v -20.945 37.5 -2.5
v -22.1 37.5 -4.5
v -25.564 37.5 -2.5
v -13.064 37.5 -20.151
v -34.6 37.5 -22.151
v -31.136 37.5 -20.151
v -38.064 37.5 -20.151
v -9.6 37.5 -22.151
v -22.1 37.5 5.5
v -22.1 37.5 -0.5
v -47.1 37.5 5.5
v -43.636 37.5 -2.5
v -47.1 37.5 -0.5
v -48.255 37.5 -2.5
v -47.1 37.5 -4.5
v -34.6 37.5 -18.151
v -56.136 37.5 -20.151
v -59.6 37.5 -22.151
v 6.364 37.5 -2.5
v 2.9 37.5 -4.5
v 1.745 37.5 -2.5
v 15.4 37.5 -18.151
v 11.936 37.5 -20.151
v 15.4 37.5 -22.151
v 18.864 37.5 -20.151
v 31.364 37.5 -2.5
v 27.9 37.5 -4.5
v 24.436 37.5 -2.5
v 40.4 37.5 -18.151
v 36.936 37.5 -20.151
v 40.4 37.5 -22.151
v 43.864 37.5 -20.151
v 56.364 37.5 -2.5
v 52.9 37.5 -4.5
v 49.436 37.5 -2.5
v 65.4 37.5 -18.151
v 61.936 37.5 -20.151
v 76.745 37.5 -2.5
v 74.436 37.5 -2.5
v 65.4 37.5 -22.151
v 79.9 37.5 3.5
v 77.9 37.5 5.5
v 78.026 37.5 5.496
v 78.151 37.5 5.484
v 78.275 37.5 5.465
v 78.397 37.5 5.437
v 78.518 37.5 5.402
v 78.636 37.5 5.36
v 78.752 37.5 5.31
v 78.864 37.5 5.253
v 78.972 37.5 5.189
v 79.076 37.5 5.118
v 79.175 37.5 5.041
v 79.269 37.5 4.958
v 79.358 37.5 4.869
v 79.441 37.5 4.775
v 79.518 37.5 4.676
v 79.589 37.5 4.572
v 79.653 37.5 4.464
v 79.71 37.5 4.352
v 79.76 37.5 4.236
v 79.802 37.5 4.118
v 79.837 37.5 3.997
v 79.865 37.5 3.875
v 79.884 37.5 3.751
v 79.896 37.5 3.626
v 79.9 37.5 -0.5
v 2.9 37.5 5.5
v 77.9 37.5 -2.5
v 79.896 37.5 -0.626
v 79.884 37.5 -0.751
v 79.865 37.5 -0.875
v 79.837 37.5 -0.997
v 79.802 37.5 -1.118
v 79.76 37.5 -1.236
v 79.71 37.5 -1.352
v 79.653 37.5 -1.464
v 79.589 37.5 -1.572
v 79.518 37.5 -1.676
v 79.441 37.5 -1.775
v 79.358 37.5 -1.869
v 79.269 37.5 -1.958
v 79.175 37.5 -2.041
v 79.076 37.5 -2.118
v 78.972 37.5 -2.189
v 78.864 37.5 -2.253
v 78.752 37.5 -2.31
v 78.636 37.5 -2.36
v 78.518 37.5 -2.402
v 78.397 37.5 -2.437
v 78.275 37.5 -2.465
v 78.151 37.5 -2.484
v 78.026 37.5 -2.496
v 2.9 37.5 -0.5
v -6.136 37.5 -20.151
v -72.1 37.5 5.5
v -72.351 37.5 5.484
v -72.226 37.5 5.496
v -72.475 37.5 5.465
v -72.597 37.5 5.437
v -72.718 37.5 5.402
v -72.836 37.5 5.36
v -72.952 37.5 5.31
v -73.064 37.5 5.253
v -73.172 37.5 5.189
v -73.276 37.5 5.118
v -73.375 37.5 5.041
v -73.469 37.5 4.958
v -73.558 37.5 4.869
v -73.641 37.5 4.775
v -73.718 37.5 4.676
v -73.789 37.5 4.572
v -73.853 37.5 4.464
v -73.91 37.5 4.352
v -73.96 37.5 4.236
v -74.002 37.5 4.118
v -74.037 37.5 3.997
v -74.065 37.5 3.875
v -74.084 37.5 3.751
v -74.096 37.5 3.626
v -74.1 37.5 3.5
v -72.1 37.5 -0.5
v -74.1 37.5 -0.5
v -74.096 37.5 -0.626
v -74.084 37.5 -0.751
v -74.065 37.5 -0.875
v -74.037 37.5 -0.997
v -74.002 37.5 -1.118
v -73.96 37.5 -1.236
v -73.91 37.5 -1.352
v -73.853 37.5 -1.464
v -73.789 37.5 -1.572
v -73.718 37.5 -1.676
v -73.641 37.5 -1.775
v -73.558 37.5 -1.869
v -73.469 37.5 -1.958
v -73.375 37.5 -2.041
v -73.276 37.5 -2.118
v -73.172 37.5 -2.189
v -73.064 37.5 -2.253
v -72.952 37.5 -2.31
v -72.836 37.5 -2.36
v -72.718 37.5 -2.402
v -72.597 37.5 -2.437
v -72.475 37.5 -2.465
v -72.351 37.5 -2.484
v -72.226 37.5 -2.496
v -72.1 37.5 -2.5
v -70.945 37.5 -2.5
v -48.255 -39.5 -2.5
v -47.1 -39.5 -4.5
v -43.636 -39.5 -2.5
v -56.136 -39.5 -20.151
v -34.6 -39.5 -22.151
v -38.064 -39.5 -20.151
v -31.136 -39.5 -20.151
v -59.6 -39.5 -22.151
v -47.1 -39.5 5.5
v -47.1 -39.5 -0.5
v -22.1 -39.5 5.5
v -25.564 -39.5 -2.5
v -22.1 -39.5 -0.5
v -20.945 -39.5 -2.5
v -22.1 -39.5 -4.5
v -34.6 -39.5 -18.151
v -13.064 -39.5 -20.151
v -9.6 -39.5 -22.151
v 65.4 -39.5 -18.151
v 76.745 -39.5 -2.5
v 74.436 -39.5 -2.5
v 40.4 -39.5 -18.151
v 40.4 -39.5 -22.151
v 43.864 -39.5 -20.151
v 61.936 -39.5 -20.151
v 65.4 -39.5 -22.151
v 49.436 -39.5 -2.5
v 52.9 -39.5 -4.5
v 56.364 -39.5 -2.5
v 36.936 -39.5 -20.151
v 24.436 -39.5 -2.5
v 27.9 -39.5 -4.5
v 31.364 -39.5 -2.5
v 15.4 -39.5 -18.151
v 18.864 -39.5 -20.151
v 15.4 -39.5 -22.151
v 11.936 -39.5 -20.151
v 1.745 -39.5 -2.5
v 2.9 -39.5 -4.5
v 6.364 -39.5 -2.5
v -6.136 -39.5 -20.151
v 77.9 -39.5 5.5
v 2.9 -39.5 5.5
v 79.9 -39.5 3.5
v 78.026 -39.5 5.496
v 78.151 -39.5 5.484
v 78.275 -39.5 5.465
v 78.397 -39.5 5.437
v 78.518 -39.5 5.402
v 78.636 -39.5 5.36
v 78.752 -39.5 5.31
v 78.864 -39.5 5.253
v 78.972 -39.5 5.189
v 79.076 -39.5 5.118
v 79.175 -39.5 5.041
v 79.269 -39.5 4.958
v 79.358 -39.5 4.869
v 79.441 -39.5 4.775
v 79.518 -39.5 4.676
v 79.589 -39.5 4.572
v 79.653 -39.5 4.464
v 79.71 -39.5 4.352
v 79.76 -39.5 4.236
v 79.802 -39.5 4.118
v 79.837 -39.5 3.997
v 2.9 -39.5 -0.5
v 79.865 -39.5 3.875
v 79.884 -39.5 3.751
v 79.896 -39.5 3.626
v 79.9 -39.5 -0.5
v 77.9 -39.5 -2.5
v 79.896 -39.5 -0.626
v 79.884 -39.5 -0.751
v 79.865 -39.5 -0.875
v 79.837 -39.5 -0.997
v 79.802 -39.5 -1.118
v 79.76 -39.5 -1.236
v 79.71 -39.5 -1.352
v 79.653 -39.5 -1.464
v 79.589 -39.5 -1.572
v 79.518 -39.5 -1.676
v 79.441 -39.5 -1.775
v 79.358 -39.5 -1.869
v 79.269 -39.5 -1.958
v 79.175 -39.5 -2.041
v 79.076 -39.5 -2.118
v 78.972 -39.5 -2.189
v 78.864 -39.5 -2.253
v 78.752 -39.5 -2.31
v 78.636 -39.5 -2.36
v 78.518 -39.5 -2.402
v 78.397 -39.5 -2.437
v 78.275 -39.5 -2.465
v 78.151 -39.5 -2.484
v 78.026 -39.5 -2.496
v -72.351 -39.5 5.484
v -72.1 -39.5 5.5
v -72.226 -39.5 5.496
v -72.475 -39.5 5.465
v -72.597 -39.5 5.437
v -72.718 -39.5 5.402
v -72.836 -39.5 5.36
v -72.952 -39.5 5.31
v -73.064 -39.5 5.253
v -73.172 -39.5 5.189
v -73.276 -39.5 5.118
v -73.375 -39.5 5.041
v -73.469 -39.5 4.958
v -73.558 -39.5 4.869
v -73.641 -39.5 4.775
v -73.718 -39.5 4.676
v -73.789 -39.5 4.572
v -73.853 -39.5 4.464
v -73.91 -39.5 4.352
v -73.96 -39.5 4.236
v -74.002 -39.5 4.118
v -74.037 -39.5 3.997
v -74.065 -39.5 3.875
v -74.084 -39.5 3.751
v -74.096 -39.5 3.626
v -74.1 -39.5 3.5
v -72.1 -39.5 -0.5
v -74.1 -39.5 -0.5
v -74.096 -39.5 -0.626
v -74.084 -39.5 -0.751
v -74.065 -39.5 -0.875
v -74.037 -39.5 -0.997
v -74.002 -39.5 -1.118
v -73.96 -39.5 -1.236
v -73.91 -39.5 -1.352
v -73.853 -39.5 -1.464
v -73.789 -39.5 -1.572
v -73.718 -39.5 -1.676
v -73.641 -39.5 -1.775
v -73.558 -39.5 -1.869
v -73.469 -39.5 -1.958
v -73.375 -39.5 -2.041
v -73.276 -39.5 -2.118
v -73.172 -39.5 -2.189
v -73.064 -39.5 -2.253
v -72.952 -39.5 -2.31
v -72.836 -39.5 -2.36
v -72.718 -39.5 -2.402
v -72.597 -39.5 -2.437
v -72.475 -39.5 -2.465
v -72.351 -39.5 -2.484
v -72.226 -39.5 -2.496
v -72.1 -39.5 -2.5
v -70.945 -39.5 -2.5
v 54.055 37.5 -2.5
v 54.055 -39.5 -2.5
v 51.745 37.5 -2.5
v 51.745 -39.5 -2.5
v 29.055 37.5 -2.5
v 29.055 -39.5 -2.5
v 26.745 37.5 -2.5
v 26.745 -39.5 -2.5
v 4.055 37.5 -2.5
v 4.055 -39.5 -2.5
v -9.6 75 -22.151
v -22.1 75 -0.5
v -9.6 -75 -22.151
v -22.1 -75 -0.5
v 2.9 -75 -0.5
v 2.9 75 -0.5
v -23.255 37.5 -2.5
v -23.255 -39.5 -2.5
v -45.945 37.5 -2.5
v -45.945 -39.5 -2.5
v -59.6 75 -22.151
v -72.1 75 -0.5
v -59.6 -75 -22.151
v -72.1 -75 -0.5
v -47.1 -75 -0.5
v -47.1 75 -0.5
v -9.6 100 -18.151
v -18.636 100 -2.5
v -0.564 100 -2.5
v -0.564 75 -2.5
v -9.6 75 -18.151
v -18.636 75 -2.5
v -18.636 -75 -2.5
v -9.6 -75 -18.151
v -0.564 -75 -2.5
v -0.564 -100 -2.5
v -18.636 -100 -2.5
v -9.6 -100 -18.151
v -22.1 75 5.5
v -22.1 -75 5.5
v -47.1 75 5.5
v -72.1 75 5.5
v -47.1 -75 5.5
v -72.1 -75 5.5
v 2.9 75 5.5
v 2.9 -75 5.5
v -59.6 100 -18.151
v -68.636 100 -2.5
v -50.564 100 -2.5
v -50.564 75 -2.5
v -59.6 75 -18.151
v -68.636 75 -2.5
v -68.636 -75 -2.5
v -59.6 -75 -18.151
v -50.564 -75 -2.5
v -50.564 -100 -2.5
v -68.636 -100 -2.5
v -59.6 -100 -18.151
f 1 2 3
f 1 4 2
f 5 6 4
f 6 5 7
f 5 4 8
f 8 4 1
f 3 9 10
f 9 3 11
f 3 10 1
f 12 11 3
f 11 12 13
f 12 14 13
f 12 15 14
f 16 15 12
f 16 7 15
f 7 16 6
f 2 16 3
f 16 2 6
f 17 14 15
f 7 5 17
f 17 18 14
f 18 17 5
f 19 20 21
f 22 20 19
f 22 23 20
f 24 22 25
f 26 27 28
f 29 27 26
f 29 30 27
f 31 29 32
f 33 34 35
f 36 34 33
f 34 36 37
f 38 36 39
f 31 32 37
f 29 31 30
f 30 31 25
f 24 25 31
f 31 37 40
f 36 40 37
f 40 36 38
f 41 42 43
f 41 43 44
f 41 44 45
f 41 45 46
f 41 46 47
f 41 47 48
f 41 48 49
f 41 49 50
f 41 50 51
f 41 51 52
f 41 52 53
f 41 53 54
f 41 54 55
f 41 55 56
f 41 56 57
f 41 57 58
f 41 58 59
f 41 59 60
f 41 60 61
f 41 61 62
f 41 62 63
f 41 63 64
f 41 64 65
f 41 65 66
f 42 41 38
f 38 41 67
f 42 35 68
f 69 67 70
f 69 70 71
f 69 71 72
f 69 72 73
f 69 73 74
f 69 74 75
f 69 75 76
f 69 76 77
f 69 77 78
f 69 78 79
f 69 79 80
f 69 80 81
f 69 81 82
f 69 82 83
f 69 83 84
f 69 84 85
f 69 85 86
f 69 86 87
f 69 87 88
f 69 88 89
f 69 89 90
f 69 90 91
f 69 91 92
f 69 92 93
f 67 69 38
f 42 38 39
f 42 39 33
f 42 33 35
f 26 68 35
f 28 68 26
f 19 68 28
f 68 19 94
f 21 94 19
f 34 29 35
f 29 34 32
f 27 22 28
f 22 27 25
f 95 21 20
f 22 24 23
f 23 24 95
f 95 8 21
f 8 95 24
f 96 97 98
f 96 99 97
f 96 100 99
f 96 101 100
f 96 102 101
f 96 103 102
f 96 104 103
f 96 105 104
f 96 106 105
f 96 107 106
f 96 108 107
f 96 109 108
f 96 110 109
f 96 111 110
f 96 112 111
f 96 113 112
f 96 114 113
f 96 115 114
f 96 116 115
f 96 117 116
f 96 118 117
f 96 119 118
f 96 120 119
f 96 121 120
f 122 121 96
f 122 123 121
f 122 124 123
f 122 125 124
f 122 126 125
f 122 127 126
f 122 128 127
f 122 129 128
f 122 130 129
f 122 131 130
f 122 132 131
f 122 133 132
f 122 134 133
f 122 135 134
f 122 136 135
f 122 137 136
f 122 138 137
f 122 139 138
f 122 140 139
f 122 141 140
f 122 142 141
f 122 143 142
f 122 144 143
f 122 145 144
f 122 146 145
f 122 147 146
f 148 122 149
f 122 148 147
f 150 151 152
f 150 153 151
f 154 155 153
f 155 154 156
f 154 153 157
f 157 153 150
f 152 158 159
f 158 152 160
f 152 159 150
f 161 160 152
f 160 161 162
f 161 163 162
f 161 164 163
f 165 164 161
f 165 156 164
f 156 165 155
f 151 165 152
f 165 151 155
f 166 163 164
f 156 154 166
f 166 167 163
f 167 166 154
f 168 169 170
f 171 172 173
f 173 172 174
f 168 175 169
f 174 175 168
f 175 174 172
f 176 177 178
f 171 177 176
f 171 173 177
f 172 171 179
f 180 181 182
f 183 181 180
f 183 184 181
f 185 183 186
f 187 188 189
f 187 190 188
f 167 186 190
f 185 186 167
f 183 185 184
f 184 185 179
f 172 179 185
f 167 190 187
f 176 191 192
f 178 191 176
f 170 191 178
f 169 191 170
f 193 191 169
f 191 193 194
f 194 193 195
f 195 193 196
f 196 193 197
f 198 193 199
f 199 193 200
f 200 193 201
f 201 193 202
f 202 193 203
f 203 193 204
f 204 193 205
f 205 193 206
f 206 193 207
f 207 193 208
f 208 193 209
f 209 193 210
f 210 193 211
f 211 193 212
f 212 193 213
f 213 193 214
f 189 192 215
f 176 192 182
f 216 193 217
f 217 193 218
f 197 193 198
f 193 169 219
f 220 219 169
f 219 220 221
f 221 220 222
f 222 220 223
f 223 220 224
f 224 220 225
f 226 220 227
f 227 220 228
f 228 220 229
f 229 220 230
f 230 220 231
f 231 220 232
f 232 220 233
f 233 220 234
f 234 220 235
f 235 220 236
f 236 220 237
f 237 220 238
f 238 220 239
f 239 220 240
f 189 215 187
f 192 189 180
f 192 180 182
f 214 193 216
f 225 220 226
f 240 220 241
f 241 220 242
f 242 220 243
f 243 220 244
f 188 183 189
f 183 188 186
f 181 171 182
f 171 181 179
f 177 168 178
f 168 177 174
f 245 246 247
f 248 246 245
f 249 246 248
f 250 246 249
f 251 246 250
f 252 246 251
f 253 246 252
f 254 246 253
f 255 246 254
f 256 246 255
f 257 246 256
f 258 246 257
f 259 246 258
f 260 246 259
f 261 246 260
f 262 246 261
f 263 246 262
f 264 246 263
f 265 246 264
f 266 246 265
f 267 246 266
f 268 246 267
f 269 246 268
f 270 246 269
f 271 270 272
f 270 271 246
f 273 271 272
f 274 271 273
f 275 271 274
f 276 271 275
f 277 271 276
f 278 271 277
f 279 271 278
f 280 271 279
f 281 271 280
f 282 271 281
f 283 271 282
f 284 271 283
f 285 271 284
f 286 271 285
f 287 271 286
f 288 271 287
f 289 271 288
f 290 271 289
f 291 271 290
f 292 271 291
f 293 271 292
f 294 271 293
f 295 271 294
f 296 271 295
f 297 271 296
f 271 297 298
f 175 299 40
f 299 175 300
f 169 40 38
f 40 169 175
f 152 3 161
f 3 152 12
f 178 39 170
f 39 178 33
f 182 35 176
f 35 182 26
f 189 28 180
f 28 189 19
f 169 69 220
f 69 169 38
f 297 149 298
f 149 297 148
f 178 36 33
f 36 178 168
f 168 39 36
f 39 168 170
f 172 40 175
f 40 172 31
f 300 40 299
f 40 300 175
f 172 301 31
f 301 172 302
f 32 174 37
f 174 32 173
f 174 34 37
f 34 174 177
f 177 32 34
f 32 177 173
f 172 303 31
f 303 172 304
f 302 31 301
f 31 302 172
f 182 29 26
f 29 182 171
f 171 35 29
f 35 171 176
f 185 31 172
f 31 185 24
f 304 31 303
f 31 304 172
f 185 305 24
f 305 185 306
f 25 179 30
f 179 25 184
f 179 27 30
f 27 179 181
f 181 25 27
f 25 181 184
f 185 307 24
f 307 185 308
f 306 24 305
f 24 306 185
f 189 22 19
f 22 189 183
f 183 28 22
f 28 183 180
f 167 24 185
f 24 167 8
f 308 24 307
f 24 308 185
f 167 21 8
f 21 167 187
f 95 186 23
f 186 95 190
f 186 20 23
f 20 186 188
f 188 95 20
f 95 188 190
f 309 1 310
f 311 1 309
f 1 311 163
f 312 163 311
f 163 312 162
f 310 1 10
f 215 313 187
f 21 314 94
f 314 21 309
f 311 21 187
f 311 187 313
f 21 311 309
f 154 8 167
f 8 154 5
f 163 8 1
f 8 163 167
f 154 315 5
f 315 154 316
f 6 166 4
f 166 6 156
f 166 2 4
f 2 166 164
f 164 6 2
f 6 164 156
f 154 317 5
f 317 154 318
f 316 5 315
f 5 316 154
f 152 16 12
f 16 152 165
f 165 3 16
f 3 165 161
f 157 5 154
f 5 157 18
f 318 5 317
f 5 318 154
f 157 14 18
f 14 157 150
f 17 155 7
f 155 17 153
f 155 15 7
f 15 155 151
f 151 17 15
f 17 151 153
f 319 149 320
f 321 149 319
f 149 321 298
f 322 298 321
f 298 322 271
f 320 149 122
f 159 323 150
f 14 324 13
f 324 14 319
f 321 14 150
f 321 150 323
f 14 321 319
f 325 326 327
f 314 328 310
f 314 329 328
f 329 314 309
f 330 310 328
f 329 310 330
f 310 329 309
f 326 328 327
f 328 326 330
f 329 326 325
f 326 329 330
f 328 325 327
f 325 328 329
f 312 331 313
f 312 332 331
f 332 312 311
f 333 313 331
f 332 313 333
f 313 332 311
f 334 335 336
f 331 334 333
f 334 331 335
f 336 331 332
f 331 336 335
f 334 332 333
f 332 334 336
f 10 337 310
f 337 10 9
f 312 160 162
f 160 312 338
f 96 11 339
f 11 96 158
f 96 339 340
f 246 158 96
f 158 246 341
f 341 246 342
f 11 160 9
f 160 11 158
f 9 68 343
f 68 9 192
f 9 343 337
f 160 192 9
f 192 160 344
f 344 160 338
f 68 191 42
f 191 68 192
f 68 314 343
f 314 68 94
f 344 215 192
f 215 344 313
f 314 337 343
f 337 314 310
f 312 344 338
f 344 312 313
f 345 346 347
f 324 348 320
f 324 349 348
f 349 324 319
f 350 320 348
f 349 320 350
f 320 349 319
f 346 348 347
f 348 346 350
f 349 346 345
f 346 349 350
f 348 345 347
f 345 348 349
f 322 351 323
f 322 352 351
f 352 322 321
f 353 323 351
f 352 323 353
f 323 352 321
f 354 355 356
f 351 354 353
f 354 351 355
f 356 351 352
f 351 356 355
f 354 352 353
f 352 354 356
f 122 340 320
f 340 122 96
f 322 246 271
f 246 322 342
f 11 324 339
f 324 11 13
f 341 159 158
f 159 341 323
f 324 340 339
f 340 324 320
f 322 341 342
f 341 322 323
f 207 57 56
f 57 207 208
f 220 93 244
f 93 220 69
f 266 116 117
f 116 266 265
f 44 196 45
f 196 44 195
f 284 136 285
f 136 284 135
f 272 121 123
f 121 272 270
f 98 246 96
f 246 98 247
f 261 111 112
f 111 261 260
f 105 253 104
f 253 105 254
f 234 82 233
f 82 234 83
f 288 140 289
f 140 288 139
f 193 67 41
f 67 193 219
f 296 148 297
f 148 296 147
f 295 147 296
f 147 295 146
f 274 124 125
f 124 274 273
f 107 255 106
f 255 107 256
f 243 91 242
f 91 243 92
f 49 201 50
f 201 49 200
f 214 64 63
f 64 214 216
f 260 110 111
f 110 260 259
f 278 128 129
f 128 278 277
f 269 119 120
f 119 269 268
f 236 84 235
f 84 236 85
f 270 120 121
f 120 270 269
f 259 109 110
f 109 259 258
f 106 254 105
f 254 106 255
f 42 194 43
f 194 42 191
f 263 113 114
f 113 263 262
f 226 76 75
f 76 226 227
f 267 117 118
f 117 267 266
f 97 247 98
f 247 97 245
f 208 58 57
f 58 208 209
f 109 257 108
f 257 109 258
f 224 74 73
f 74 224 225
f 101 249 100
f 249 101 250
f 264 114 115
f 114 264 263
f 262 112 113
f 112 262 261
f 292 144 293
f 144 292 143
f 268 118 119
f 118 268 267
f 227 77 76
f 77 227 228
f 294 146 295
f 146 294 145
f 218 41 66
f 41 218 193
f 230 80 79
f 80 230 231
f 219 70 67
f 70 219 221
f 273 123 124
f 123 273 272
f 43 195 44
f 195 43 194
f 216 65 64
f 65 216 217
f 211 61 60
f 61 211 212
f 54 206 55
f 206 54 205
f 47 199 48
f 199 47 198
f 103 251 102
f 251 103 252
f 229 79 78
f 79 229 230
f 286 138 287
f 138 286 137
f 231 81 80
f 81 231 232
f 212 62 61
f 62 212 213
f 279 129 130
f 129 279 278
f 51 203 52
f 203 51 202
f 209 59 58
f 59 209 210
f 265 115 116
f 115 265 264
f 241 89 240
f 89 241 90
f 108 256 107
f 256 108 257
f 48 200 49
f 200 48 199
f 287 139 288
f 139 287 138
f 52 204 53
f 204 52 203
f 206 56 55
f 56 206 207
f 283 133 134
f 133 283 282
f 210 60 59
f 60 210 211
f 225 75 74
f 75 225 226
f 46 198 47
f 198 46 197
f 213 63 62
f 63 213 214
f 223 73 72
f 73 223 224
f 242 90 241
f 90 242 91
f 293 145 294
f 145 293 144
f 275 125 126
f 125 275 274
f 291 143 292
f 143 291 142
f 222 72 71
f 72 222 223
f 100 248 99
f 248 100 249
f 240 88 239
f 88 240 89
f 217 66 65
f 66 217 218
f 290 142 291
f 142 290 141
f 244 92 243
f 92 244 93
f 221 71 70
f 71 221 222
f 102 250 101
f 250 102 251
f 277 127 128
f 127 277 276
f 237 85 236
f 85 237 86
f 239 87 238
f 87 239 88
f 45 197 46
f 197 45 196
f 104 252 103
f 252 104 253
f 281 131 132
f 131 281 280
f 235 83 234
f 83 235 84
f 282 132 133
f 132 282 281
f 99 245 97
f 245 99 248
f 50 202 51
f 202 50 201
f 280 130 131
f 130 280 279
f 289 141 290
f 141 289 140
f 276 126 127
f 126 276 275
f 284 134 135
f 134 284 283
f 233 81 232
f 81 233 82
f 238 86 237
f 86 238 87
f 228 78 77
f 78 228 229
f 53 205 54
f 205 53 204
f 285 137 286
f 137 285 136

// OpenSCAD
epaisseur_flycase = 14.5;
hauteur_flycase = 65;
epaisseur = 4;
epaisseur_minkowski = 2;
epaisseur_triangle = epaisseur/2;
longueur_support = 150;
largeur_support = 25;
longueur_PC = 150;
hauteur_PC = 20;
detail = 100;
angle = 30;
cote_grand_triangle = longueur_PC/6;
cote_triangle = cote_grand_triangle - 2*epaisseur_triangle/tan(angle);
hauteur_grand_triangle = cos(angle)*cote_grand_triangle;
hauteur_triangle = cos(angle)*cote_triangle;
echo(hauteur_grand_triangle);

    
module fente_flycase(){
    difference(){
        cube([epaisseur_flycase + 2*epaisseur, hauteur_flycase + epaisseur, largeur_support]);
        translate([epaisseur, 0 ,-0.5])
        cube([epaisseur_flycase, hauteur_flycase, largeur_support+1]);
    }
}

module plateau_PC(){
    minkowski (){
        union(){
            cube([longueur_PC, epaisseur, largeur_support - epaisseur_minkowski]);
            cube([epaisseur, hauteur_PC,largeur_support - epaisseur_minkowski]);
        }
        cylinder(r=epaisseur_minkowski, h=epaisseur_minkowski, $fn=detail);
    }
}

module triangle(largeur){
    difference(){
        linear_extrude(height=largeur) 
        polygon(points=[[0,0],[cote_grand_triangle,0],[cote_grand_triangle/2,hauteur_grand_triangle]],paths=[ [0,1,2] ]);
        
        translate([epaisseur_triangle/tan(30),epaisseur_triangle,-0.5])
        linear_extrude(height=largeur+1) 
        polygon(points=[[0,0],[cote_triangle,0],[cote_triangle/2,hauteur_triangle]],paths=[ [0,1,2] ]);
    }
}

module pattern_triangle(largeur, n, x){
    for ( j = [0 : n-x] ){   
        for ( i = [1 : n-j] ){   
            translate([(j*1/2+i-1)*cote_grand_triangle,j*hauteur_grand_triangle,0])
            triangle(largeur);
            if(i<(n-j)){
                translate([(i+(1+j)/2)*cote_grand_triangle,(j+1)*hauteur_grand_triangle,0])
                rotate([0,0,180])
                triangle(largeur);
            }
        }
    }
}

module support_triangles(){
    difference(){
        union(){
            translate([longueur_PC+epaisseur/2,0,0])
            rotate([0,0,180])
            pattern_triangle(largeur_support, 6,3);
            plateau_PC();
        }
        
        translate([longueur_PC,0,0])
    rotate([0,0,1.5*angle])
    translate([-6*hauteur_grand_triangle,-2*cote_grand_triangle,-0.5])
    cube([6*hauteur_grand_triangle+epaisseur, 2*cote_grand_triangle, largeur_support+1]);
    }
    rotate([0,0,-2*angle])
    translate([0,-epaisseur/2,0])
    cube([4*cote_grand_triangle+2*epaisseur_minkowski, epaisseur, largeur_support]);
    
    translate([longueur_PC,0,0])
    rotate([0,0,1.5*angle])
    translate([-5*hauteur_grand_triangle-epaisseur/2,-epaisseur/2,0])
    cube([5*hauteur_grand_triangle+epaisseur, epaisseur, largeur_support]);
}

module support_1(){
    difference(){
    translate([epaisseur/4,cote_grand_triangle,0])
    rotate([0,0,angle])
    translate([-3*cote_grand_triangle,0,0])
    support_triangles();
    translate([hauteur_grand_triangle+epaisseur,-(hauteur_flycase+epaisseur),-0.5])
    cube([epaisseur_flycase + 2*epaisseur, hauteur_flycase + epaisseur, largeur_support+1]);
}
translate([hauteur_grand_triangle+epaisseur,-(hauteur_flycase+epaisseur),0])
fente_flycase();

}


module barre(){
    rotate([90,0,0])
    difference(){
        linear_extrude(height=longueur_support+2*largeur_support) 
        polygon(points=[[0,0],[cote_grand_triangle,0],[cote_grand_triangle/2,hauteur_grand_triangle]],paths=[ [0,1,2] ]);
        triangle(largeur_support);
        translate([0,0,longueur_support+largeur_support]) triangle(largeur_support);
    }
    translate([0,-longueur_support-largeur_support,-(epaisseur+epaisseur_minkowski)])
        cube([cote_grand_triangle, longueur_PC, epaisseur+epaisseur_minkowski]);
}

module support_2(){
    translate([epaisseur/2+0.9,0,-0.5])
    union(){
        translate([0,0,epaisseur_minkowski])
        minkowski (){
            cube([longueur_PC, 3*largeur_support, epaisseur], center=true);
            rotate([90,0,0]) cylinder(r=epaisseur_minkowski, h=epaisseur_minkowski, $fn=detail);
        }
        translate([longueur_PC/2,3*largeur_support/2,0])
                rotate([-90,0,180])
                pattern_triangle(3*largeur_support+epaisseur_minkowski, 6,6);
        rotate([0,180,0])
        translate([0,largeur_support+longueur_support/2,0])barre();
            

        translate([-2*cote_grand_triangle,0,0])
        rotate([0,180,0])
        translate([0,largeur_support+longueur_support/2,0])
            barre();
    }
}

module support_complet(){
    support_1();
    translate([0,0,longueur_support+largeur_support])
    support_1();
    translate([2*hauteur_grand_triangle,2*cote_grand_triangle,longueur_support/2+largeur_support])
    rotate([-90,0,angle])
    support_2();

}
//barre();
//support_1();
support_2();
//support_complet();
